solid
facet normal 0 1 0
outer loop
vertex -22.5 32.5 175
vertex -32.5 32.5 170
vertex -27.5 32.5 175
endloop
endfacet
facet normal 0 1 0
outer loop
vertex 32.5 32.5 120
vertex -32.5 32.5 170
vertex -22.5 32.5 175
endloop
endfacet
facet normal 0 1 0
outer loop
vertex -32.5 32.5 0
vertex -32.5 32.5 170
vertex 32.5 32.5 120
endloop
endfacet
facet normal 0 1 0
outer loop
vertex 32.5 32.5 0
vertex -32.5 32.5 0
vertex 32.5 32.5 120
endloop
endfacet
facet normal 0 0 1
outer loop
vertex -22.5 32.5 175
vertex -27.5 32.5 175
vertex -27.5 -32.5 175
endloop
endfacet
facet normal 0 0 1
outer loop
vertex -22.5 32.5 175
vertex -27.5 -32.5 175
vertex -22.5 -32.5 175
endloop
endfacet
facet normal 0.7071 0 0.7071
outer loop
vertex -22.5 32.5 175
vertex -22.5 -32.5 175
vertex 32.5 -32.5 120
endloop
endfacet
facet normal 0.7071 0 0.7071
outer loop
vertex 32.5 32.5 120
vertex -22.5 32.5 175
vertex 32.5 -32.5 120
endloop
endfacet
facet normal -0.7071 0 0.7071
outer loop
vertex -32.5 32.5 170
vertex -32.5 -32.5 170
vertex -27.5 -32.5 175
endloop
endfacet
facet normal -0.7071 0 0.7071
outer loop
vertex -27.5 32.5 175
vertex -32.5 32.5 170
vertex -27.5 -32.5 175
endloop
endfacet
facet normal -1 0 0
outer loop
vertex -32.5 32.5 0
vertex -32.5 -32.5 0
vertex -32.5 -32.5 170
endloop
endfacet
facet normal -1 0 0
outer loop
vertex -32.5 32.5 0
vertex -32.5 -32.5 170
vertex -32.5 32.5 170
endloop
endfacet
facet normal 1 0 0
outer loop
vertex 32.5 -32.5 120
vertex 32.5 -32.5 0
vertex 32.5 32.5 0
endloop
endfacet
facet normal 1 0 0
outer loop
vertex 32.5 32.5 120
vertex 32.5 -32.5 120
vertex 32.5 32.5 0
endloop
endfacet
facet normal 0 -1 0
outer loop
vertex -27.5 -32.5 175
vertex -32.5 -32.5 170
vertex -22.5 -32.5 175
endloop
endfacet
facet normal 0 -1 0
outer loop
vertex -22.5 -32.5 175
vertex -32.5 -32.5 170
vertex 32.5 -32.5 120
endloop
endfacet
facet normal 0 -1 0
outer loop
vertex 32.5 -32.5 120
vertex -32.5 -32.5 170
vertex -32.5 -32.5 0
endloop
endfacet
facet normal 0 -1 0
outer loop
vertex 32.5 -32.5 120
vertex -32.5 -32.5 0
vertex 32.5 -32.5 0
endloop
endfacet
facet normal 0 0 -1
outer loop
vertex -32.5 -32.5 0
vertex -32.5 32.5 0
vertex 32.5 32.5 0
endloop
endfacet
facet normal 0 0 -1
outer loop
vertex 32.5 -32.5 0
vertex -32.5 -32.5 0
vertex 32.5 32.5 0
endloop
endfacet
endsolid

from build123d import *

# Parameters (mm, degrees)
F0_W      = 65
F0_H      = 65
F1_DEPTH  = 350
F3_DEPTH  = 65.001
F4_W      = 75
F4_H      = 65
F5_DEPTH  = 2
F6_W      = 65
F6_H      = 75
F7_DEPTH  = 2
F10_DEPTH = 65.001


with BuildPart() as f1:
    # F0 (on Top) → F1 (new body)
    with BuildSketch(Plane.XY):
        Rectangle(F0_W, F0_H)
    extrude(amount=F1_DEPTH)

    # F2 (on face) → F3 (cut, through all)
    with BuildSketch(Plane.XZ.offset(32.5)):
        Polygon((-22.5, 175), (32.5, 120), (32.5, 230), align=None)
        Polygon((-32.5, 180), (-32.5, 170), (-27.5, 175), align=None)
    extrude(amount=-F3_DEPTH, mode=Mode.SUBTRACT)

    # F9 (on face) → F10 (cut, through all)
    with BuildSketch(Plane.XZ.offset(32.5)):
        Polygon((-32.5, 180), (-27.5, 175), (-22.5, 175), (32.5, 230), (32.5, 350), (-32.5, 350), align=None)
    extrude(amount=-F10_DEPTH, mode=Mode.SUBTRACT)


with BuildPart() as f5:
    # F4 (on face) → F5 (new body)
    with BuildSketch(Plane(origin=(76.25, 0, 76.25), x_dir=(0.7071067812, 0, -0.7071067812), z_dir=(0.7071067812, 0, 0.7071067812))):
        with Locations((-99.3718433538, 0)):
            Rectangle(F4_W, F4_H)
    extrude(amount=F5_DEPTH)


with BuildPart() as f7:
    # F6 (on face) → F7 (new body)
    with BuildSketch(Plane(origin=(-98.75, 0, 98.75), x_dir=(0, 1, 0), z_dir=(0.7071067812, 0, -0.7071067812))):
        with Locations((0, 148.1155300615)):
            Rectangle(F6_W, F6_H)
    extrude(amount=F7_DEPTH)


solid = f1.part
